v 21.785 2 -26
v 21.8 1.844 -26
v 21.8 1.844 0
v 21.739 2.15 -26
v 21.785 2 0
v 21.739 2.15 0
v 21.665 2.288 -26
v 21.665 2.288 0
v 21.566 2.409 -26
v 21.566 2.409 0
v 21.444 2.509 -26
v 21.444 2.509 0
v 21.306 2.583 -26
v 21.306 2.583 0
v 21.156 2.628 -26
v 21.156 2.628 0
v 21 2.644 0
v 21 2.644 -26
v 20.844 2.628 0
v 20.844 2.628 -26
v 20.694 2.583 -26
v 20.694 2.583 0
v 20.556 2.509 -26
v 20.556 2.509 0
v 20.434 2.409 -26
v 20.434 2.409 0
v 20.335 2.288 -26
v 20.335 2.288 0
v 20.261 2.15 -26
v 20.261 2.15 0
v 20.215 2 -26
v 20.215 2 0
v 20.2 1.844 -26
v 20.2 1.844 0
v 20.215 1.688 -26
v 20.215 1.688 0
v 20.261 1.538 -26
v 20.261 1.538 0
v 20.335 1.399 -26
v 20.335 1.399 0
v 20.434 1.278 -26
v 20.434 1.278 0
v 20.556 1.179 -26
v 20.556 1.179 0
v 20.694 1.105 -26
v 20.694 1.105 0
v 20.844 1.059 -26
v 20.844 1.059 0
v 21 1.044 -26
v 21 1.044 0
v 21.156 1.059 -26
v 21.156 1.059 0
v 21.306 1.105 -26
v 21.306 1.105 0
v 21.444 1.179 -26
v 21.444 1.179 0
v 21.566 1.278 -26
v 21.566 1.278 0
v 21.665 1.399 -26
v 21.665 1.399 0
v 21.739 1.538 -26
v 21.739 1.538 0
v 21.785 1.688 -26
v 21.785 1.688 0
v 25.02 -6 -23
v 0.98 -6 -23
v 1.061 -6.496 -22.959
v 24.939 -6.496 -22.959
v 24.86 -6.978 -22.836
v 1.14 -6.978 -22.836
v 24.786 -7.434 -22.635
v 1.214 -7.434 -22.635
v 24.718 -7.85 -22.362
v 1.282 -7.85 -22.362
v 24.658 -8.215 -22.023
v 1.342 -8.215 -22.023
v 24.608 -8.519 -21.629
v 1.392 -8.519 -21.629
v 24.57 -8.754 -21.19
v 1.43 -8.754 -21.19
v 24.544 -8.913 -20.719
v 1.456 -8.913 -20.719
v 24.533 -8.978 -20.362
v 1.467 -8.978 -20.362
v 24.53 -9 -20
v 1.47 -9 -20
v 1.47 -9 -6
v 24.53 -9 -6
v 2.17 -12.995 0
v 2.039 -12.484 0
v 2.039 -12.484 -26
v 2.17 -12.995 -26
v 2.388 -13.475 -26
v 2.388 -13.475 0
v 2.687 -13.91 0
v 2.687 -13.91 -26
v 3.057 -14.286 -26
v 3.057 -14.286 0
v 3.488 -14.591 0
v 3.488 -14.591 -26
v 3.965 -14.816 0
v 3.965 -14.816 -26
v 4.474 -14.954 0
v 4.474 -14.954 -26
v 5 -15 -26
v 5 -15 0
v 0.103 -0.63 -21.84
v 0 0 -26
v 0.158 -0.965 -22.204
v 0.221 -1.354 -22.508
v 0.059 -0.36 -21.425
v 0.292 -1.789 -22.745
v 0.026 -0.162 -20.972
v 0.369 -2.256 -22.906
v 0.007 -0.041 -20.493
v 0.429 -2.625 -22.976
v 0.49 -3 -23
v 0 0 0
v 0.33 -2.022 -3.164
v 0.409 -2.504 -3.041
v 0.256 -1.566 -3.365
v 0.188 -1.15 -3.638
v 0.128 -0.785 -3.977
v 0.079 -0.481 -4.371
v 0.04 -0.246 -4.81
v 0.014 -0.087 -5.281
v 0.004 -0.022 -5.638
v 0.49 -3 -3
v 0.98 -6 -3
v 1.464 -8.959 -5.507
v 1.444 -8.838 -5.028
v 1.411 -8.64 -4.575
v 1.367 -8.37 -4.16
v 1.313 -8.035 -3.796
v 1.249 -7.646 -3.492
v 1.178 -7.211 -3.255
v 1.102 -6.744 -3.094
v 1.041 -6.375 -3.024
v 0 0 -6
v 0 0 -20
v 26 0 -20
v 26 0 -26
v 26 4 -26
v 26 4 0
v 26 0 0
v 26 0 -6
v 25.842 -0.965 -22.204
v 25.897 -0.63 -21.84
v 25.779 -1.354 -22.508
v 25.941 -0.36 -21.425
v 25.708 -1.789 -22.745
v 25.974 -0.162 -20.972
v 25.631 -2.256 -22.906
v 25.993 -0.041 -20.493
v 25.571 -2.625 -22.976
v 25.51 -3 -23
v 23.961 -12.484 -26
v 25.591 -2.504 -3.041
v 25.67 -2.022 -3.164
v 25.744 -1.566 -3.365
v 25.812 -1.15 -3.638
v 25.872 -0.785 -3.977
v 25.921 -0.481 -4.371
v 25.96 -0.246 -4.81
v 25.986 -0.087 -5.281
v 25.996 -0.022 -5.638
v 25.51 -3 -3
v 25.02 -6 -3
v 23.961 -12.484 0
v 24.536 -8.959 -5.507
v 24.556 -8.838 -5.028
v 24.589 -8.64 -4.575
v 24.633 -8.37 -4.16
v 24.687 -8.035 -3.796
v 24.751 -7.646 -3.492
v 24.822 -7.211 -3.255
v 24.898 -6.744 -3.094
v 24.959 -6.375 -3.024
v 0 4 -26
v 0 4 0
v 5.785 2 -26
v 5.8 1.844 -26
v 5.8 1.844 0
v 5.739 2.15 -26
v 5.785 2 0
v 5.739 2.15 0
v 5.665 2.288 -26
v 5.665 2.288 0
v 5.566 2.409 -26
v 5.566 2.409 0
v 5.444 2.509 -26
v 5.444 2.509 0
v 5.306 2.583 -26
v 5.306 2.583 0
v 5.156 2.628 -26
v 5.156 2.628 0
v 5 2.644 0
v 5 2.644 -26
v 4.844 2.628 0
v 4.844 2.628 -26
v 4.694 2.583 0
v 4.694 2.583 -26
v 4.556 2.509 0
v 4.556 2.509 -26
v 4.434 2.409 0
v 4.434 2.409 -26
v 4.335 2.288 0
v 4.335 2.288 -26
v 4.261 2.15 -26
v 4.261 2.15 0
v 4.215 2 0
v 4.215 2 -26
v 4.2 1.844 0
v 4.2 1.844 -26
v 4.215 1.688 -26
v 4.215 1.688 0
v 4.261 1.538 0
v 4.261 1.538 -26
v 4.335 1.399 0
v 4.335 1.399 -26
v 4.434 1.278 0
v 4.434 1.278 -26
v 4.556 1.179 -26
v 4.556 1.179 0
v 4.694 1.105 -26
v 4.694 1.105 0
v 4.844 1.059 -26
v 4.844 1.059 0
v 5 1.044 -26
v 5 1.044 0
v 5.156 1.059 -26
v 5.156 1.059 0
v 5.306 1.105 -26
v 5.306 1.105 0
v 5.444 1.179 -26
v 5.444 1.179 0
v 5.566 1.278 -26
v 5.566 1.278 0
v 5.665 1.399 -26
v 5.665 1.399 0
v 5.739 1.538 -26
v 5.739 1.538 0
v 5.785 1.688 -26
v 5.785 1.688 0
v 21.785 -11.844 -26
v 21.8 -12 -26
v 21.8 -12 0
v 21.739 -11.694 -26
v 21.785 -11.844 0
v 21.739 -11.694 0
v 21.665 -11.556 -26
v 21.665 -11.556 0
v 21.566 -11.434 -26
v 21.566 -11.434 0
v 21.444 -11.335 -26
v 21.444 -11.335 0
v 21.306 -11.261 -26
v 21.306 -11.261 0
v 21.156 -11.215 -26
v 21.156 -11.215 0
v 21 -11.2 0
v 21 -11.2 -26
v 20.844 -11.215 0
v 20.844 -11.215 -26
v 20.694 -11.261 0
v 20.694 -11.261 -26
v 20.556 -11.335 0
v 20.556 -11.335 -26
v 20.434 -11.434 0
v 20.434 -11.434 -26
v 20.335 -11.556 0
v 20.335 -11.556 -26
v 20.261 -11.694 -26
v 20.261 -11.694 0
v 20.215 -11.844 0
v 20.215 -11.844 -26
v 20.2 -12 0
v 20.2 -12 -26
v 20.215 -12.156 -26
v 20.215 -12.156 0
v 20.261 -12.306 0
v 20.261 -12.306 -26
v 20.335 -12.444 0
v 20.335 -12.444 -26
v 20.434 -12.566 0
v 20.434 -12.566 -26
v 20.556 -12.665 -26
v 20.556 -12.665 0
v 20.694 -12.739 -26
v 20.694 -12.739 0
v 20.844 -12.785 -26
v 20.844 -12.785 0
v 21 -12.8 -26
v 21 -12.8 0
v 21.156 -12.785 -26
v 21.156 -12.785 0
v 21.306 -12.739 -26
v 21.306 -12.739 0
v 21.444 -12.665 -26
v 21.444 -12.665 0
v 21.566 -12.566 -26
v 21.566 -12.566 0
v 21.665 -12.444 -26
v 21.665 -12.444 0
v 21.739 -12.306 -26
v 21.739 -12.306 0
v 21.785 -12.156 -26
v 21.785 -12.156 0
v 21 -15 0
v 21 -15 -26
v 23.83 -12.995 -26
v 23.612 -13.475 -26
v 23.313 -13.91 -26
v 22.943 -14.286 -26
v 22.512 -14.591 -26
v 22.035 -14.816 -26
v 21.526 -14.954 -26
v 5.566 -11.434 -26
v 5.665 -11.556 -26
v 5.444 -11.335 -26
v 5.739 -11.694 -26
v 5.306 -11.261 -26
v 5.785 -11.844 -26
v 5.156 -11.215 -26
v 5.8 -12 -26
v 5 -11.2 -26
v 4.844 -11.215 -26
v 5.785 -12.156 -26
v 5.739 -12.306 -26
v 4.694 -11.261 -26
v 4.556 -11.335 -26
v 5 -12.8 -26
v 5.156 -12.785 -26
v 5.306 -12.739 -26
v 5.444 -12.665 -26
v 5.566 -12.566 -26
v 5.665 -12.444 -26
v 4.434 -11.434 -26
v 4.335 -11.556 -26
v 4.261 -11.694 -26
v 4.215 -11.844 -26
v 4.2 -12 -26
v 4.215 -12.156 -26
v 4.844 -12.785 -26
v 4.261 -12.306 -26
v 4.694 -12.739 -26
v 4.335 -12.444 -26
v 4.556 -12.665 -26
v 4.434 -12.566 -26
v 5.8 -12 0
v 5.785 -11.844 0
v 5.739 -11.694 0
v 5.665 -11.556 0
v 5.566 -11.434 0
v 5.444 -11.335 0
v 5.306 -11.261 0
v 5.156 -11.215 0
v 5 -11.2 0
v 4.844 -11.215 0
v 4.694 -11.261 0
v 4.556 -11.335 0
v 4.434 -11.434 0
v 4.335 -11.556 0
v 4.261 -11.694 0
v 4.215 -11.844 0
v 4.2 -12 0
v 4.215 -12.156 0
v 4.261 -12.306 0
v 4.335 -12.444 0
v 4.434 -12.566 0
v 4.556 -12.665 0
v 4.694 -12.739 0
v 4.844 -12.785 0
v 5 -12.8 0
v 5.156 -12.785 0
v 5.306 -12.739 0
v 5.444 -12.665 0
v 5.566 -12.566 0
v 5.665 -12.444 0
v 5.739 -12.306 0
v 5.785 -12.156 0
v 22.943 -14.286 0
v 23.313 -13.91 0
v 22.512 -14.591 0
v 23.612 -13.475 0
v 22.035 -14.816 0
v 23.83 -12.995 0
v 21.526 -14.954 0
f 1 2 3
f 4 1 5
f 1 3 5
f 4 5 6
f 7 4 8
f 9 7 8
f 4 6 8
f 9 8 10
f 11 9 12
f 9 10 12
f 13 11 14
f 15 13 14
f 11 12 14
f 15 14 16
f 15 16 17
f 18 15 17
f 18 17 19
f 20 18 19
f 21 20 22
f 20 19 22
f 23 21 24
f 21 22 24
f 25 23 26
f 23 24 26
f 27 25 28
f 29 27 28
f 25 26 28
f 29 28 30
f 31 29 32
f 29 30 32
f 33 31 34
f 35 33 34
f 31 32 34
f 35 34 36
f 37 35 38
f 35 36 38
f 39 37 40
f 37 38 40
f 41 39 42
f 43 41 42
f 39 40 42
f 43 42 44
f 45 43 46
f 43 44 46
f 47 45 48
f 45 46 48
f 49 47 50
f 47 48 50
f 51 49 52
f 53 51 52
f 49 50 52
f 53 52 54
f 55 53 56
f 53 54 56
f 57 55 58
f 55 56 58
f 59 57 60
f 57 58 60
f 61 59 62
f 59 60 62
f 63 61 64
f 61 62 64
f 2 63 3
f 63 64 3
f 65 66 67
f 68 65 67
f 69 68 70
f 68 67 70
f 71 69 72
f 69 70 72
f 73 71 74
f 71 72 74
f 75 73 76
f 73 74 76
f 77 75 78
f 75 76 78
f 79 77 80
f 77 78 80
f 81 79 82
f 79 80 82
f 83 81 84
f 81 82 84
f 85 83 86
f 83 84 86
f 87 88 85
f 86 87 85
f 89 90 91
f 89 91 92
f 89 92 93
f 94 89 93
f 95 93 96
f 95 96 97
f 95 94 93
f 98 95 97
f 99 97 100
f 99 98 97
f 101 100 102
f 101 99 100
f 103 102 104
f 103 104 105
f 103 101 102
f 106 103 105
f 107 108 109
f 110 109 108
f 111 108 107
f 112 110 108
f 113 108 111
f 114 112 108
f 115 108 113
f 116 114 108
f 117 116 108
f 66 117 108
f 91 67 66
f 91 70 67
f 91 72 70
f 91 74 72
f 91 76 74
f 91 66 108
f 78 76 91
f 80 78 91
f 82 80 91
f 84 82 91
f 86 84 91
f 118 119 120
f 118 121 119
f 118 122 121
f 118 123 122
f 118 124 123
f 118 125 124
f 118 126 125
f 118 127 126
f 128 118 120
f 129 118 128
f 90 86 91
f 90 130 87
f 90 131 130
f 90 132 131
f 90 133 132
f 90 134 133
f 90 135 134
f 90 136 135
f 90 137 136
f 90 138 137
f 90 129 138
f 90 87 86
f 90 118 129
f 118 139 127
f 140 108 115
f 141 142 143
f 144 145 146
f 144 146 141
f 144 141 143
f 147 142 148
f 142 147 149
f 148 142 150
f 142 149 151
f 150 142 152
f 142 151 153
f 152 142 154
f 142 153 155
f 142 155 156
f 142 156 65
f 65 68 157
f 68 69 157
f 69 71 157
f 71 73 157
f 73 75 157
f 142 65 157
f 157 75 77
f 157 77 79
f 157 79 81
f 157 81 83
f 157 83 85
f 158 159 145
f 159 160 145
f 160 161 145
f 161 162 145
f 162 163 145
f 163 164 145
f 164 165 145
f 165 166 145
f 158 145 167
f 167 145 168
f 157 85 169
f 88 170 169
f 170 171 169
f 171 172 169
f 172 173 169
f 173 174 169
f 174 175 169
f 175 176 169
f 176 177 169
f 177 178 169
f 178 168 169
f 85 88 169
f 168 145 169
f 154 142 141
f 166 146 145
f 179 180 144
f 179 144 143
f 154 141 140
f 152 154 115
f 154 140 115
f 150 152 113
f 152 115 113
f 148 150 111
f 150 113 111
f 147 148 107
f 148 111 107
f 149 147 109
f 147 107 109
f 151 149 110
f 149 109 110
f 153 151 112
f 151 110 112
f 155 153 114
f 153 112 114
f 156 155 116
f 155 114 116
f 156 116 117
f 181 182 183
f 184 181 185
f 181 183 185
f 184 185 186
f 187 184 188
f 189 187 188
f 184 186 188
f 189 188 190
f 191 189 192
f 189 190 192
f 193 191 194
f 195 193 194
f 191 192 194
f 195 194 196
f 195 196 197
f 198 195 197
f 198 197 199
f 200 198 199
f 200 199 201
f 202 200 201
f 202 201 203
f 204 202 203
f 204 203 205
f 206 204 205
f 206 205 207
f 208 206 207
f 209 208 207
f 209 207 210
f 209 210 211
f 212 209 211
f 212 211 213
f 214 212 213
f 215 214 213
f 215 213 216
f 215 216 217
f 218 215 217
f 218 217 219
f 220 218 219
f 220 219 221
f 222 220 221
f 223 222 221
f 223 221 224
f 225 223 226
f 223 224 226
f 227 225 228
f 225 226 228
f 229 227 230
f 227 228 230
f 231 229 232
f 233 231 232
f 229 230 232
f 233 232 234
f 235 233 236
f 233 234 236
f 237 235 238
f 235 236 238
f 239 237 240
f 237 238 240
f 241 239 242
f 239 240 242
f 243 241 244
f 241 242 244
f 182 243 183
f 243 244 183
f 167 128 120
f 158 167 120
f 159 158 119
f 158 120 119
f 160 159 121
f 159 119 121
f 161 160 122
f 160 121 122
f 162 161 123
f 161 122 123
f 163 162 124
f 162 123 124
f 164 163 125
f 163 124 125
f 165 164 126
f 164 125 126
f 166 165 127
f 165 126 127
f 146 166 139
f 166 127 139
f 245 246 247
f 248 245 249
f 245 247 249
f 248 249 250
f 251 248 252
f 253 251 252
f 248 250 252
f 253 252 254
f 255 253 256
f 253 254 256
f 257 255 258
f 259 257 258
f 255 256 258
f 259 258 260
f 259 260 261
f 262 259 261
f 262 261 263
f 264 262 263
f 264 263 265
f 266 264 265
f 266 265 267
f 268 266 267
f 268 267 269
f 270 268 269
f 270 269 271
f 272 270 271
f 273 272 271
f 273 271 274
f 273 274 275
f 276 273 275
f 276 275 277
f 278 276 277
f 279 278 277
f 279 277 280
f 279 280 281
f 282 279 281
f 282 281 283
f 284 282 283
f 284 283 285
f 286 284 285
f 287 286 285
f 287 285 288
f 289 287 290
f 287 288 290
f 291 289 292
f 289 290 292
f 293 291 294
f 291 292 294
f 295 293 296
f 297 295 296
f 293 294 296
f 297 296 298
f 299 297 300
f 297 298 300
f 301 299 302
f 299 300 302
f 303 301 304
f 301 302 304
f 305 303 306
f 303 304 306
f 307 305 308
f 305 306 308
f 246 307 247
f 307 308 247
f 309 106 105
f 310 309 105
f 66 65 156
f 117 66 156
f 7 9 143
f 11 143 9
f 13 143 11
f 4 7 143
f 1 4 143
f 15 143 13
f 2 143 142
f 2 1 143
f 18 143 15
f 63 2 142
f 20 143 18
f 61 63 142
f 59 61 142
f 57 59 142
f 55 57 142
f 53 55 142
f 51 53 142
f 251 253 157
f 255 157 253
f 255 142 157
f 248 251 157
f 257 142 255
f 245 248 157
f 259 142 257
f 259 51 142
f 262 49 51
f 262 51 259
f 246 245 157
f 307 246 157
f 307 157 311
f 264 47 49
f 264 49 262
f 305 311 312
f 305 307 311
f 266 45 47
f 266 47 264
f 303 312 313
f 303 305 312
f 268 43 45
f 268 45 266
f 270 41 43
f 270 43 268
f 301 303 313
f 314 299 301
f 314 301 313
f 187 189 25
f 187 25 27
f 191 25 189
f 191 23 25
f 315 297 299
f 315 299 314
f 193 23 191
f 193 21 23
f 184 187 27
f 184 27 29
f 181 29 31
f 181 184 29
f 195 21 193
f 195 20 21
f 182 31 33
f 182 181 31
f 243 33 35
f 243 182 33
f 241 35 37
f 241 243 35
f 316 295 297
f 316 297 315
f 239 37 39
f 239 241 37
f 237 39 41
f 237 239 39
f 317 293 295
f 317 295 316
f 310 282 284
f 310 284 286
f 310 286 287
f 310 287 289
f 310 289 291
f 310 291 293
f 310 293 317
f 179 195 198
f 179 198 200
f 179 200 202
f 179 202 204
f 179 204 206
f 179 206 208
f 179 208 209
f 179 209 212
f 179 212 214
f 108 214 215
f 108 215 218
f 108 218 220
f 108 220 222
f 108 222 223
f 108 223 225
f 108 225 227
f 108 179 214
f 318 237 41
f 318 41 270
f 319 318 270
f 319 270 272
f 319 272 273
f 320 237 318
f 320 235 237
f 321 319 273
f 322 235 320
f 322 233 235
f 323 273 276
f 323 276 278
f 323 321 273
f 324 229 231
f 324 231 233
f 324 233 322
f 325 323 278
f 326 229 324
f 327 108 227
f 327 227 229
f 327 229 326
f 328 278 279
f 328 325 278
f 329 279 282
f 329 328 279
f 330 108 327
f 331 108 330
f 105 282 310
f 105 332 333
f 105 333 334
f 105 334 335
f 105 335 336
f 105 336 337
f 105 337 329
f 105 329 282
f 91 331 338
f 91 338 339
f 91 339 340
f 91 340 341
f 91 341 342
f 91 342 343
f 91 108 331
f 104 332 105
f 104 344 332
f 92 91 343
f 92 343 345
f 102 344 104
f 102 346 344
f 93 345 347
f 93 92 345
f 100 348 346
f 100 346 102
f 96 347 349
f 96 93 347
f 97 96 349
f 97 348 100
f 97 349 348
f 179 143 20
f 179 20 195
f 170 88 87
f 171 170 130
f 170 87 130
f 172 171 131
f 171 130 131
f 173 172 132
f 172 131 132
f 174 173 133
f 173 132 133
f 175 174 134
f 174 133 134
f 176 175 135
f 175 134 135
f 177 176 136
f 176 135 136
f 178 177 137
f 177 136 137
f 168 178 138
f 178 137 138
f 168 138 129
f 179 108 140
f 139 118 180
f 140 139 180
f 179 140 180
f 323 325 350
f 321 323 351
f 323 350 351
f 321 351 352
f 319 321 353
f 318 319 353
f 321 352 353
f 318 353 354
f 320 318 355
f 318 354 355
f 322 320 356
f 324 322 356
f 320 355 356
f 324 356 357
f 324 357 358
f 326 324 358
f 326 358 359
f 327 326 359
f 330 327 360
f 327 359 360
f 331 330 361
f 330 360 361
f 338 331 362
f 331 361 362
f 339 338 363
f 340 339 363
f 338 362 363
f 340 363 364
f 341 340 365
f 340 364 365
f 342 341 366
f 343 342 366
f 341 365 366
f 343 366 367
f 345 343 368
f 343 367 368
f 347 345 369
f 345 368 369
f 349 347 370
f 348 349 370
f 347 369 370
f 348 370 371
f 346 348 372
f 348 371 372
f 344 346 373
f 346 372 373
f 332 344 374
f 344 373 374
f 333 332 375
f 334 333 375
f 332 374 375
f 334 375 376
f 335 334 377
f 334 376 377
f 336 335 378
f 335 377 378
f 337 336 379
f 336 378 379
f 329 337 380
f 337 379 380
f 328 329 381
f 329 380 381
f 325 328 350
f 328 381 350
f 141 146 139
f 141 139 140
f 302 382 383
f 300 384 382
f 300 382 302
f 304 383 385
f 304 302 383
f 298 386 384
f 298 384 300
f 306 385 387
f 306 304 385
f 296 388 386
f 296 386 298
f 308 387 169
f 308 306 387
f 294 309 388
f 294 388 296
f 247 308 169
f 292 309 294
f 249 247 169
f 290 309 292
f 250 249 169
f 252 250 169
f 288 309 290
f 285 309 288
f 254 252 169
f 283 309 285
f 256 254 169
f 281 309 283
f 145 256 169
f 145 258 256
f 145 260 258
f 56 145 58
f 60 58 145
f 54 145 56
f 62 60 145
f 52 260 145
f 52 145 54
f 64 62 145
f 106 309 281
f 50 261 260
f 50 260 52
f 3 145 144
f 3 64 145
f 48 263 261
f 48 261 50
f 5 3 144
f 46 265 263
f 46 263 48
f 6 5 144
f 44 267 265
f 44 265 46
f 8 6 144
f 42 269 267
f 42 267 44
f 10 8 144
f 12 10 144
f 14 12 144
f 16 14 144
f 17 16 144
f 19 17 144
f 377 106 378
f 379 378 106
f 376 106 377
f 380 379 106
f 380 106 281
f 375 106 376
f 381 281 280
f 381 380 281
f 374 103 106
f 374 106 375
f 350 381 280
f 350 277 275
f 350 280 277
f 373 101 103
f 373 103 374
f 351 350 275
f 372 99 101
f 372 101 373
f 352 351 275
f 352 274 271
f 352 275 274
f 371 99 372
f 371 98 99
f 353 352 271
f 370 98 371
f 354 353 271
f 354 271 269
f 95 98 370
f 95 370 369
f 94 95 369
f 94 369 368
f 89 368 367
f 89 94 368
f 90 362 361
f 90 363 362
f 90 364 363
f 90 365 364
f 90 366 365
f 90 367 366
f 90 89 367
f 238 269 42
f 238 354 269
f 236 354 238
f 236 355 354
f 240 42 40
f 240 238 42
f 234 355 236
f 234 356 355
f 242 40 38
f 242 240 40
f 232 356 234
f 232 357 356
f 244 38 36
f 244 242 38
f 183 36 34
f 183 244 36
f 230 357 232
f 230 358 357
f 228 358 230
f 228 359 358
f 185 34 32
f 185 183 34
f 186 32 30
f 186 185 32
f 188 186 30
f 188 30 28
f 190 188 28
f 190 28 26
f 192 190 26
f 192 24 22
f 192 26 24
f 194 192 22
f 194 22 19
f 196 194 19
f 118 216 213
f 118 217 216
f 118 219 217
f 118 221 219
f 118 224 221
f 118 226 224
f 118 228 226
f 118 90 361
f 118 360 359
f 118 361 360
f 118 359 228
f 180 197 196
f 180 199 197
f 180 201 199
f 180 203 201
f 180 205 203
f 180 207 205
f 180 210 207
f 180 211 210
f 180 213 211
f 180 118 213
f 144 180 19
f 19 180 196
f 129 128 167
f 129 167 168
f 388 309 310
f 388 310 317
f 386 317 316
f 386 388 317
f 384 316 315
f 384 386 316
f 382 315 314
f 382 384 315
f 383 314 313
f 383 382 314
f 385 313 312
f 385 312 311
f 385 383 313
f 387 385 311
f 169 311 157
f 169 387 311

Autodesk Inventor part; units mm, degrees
ref_plane "YZ Plane" through (0, 0, 0) normal (1, 0, 0) x (0, 1, 0)
ref_plane "XZ Plane" through (0, 0, 0) normal (0, 1, 0) x (-1, 0, 0)
ref_plane "XY Plane" through (0, 0, 0) normal (0, 0, 1) x (1, 0, 0)
sketch "スケッチ3" plane through (0, 0, 0) normal (1, 0, 0) x (0, 1, 0)
  line L0 (0, 0) -> (4, 0)
  line L1 (4, 0) -> (4, -26)
  line L2 (4, -26) -> (0, -26)
  line L3 (0, -26) -> (0, 0)
  line L4 (4, 0) -> (0, 0)
  line L5 (0, 0) -> (0, -26)
  line L6 (0, -26) -> (4, -26)
  line L7 (4, -26) -> (4, 0)
  line L8 (0, 0) -> (-15, 0)
  line L9 (-15, 0) -> (-15, -26)
  line L10 (-15, -26) -> (0, -26)
  line L11 (0, -26) -> (0, 0)
  dimension "d3" = 26
  dimension "d4" = 4
  dimension "d49" = 15
extrude "押し出し2" add sketch "スケッチ3" along normal blind 26
sketch "スケッチ11" plane through (0, -15, 0) normal (0, 0, 1) x (1, 0, 0)
  circle A0 centre (5, 16.8437) radius 0.8 projected
  circle A1 centre (21, 16.8437) radius 0.8 projected
  point P0 (0, 15)
extrude "押し出し11" cut sketch "スケッチ11" against normal through all
sketch "スケッチ12" plane through (26, 0, 0) normal (1, 0, 0) x (0, 0, -1)
  line L0 (0, 4) -> (0, -15) projected
  line L1 (3, 0) -> (3, -9)
  line L2 (3, -9) -> (23, -9)
  line L3 (23, -9) -> (23, 0)
  line L4 (3, 0) -> (23, 0)
  line L5 (26, 4) -> (0, 4) projected
  line L6 (0, -15) -> (26, -15) projected
  point P0 (0, 0)
  point P1 (0, -0.1563)
  point P2 (13, 4)
  point P3 (13, 0)
  dimension "d62" = 3
  dimension "d63" = 6
extrude "押し出し12" cut sketch "スケッチ12" against normal through all
fillet "フィレット1" radius 3 4 edges at (13, 0, -23) (13, 0, -3) (13, -9, -23) (13, -9, -3)
sketch "スケッチ13" plane through (0, -15, 0) normal (0, 0, 1) x (1, 0, 0)
  line L0 (0, 15) -> (2.4503, 0)
  line L1 (0, 0) -> (26, 0) projected
  line L2 (26, 12) -> (26, 15) projected
  line L3 (26, 15) -> (23.5494, -0.0019)
  circle A0 centre (5, 3) radius 3
  circle A1 centre (21, 3) radius 3
  line L4 (0, 0) -> (26, 0) projected
  line L5 (0, 19) -> (26, 19) projected
  line L6 (13, 19) -> (13, 0)
  circle A2 centre (5, 3) radius 0.8
  circle A3 centre (21, 3) radius 0.8
  circle A4 centre (5, 16.8437) radius 0.8 projected
  circle A5 centre (21, 16.8437) radius 0.8 projected
  line L7 (0, 19) -> (0, 0) projected
  line L8 (0, 0) -> (26, 0) projected
  line L9 (26, 19) -> (26, 0) projected
  line L10 (0, 19) -> (26, 19) projected
  point P0 (5, 0)
  point P1 (2.0392, 2.5164)
  point P2 (23.9608, 2.5164)
  point P3 (21, 0)
  dimension "d64" = 16
  dimension "d65" = 6
  dimension "d66" = 1.6
  dimension "d67" = 1.6
extrude "押し出し13" cut sketch "スケッチ13" against normal through all contours L0 L1 L7 | A0 L1 L0 | A1 L3 L1 | L2 L9 L1 L3 | A2 | A3
properties part number "arm_middle"
